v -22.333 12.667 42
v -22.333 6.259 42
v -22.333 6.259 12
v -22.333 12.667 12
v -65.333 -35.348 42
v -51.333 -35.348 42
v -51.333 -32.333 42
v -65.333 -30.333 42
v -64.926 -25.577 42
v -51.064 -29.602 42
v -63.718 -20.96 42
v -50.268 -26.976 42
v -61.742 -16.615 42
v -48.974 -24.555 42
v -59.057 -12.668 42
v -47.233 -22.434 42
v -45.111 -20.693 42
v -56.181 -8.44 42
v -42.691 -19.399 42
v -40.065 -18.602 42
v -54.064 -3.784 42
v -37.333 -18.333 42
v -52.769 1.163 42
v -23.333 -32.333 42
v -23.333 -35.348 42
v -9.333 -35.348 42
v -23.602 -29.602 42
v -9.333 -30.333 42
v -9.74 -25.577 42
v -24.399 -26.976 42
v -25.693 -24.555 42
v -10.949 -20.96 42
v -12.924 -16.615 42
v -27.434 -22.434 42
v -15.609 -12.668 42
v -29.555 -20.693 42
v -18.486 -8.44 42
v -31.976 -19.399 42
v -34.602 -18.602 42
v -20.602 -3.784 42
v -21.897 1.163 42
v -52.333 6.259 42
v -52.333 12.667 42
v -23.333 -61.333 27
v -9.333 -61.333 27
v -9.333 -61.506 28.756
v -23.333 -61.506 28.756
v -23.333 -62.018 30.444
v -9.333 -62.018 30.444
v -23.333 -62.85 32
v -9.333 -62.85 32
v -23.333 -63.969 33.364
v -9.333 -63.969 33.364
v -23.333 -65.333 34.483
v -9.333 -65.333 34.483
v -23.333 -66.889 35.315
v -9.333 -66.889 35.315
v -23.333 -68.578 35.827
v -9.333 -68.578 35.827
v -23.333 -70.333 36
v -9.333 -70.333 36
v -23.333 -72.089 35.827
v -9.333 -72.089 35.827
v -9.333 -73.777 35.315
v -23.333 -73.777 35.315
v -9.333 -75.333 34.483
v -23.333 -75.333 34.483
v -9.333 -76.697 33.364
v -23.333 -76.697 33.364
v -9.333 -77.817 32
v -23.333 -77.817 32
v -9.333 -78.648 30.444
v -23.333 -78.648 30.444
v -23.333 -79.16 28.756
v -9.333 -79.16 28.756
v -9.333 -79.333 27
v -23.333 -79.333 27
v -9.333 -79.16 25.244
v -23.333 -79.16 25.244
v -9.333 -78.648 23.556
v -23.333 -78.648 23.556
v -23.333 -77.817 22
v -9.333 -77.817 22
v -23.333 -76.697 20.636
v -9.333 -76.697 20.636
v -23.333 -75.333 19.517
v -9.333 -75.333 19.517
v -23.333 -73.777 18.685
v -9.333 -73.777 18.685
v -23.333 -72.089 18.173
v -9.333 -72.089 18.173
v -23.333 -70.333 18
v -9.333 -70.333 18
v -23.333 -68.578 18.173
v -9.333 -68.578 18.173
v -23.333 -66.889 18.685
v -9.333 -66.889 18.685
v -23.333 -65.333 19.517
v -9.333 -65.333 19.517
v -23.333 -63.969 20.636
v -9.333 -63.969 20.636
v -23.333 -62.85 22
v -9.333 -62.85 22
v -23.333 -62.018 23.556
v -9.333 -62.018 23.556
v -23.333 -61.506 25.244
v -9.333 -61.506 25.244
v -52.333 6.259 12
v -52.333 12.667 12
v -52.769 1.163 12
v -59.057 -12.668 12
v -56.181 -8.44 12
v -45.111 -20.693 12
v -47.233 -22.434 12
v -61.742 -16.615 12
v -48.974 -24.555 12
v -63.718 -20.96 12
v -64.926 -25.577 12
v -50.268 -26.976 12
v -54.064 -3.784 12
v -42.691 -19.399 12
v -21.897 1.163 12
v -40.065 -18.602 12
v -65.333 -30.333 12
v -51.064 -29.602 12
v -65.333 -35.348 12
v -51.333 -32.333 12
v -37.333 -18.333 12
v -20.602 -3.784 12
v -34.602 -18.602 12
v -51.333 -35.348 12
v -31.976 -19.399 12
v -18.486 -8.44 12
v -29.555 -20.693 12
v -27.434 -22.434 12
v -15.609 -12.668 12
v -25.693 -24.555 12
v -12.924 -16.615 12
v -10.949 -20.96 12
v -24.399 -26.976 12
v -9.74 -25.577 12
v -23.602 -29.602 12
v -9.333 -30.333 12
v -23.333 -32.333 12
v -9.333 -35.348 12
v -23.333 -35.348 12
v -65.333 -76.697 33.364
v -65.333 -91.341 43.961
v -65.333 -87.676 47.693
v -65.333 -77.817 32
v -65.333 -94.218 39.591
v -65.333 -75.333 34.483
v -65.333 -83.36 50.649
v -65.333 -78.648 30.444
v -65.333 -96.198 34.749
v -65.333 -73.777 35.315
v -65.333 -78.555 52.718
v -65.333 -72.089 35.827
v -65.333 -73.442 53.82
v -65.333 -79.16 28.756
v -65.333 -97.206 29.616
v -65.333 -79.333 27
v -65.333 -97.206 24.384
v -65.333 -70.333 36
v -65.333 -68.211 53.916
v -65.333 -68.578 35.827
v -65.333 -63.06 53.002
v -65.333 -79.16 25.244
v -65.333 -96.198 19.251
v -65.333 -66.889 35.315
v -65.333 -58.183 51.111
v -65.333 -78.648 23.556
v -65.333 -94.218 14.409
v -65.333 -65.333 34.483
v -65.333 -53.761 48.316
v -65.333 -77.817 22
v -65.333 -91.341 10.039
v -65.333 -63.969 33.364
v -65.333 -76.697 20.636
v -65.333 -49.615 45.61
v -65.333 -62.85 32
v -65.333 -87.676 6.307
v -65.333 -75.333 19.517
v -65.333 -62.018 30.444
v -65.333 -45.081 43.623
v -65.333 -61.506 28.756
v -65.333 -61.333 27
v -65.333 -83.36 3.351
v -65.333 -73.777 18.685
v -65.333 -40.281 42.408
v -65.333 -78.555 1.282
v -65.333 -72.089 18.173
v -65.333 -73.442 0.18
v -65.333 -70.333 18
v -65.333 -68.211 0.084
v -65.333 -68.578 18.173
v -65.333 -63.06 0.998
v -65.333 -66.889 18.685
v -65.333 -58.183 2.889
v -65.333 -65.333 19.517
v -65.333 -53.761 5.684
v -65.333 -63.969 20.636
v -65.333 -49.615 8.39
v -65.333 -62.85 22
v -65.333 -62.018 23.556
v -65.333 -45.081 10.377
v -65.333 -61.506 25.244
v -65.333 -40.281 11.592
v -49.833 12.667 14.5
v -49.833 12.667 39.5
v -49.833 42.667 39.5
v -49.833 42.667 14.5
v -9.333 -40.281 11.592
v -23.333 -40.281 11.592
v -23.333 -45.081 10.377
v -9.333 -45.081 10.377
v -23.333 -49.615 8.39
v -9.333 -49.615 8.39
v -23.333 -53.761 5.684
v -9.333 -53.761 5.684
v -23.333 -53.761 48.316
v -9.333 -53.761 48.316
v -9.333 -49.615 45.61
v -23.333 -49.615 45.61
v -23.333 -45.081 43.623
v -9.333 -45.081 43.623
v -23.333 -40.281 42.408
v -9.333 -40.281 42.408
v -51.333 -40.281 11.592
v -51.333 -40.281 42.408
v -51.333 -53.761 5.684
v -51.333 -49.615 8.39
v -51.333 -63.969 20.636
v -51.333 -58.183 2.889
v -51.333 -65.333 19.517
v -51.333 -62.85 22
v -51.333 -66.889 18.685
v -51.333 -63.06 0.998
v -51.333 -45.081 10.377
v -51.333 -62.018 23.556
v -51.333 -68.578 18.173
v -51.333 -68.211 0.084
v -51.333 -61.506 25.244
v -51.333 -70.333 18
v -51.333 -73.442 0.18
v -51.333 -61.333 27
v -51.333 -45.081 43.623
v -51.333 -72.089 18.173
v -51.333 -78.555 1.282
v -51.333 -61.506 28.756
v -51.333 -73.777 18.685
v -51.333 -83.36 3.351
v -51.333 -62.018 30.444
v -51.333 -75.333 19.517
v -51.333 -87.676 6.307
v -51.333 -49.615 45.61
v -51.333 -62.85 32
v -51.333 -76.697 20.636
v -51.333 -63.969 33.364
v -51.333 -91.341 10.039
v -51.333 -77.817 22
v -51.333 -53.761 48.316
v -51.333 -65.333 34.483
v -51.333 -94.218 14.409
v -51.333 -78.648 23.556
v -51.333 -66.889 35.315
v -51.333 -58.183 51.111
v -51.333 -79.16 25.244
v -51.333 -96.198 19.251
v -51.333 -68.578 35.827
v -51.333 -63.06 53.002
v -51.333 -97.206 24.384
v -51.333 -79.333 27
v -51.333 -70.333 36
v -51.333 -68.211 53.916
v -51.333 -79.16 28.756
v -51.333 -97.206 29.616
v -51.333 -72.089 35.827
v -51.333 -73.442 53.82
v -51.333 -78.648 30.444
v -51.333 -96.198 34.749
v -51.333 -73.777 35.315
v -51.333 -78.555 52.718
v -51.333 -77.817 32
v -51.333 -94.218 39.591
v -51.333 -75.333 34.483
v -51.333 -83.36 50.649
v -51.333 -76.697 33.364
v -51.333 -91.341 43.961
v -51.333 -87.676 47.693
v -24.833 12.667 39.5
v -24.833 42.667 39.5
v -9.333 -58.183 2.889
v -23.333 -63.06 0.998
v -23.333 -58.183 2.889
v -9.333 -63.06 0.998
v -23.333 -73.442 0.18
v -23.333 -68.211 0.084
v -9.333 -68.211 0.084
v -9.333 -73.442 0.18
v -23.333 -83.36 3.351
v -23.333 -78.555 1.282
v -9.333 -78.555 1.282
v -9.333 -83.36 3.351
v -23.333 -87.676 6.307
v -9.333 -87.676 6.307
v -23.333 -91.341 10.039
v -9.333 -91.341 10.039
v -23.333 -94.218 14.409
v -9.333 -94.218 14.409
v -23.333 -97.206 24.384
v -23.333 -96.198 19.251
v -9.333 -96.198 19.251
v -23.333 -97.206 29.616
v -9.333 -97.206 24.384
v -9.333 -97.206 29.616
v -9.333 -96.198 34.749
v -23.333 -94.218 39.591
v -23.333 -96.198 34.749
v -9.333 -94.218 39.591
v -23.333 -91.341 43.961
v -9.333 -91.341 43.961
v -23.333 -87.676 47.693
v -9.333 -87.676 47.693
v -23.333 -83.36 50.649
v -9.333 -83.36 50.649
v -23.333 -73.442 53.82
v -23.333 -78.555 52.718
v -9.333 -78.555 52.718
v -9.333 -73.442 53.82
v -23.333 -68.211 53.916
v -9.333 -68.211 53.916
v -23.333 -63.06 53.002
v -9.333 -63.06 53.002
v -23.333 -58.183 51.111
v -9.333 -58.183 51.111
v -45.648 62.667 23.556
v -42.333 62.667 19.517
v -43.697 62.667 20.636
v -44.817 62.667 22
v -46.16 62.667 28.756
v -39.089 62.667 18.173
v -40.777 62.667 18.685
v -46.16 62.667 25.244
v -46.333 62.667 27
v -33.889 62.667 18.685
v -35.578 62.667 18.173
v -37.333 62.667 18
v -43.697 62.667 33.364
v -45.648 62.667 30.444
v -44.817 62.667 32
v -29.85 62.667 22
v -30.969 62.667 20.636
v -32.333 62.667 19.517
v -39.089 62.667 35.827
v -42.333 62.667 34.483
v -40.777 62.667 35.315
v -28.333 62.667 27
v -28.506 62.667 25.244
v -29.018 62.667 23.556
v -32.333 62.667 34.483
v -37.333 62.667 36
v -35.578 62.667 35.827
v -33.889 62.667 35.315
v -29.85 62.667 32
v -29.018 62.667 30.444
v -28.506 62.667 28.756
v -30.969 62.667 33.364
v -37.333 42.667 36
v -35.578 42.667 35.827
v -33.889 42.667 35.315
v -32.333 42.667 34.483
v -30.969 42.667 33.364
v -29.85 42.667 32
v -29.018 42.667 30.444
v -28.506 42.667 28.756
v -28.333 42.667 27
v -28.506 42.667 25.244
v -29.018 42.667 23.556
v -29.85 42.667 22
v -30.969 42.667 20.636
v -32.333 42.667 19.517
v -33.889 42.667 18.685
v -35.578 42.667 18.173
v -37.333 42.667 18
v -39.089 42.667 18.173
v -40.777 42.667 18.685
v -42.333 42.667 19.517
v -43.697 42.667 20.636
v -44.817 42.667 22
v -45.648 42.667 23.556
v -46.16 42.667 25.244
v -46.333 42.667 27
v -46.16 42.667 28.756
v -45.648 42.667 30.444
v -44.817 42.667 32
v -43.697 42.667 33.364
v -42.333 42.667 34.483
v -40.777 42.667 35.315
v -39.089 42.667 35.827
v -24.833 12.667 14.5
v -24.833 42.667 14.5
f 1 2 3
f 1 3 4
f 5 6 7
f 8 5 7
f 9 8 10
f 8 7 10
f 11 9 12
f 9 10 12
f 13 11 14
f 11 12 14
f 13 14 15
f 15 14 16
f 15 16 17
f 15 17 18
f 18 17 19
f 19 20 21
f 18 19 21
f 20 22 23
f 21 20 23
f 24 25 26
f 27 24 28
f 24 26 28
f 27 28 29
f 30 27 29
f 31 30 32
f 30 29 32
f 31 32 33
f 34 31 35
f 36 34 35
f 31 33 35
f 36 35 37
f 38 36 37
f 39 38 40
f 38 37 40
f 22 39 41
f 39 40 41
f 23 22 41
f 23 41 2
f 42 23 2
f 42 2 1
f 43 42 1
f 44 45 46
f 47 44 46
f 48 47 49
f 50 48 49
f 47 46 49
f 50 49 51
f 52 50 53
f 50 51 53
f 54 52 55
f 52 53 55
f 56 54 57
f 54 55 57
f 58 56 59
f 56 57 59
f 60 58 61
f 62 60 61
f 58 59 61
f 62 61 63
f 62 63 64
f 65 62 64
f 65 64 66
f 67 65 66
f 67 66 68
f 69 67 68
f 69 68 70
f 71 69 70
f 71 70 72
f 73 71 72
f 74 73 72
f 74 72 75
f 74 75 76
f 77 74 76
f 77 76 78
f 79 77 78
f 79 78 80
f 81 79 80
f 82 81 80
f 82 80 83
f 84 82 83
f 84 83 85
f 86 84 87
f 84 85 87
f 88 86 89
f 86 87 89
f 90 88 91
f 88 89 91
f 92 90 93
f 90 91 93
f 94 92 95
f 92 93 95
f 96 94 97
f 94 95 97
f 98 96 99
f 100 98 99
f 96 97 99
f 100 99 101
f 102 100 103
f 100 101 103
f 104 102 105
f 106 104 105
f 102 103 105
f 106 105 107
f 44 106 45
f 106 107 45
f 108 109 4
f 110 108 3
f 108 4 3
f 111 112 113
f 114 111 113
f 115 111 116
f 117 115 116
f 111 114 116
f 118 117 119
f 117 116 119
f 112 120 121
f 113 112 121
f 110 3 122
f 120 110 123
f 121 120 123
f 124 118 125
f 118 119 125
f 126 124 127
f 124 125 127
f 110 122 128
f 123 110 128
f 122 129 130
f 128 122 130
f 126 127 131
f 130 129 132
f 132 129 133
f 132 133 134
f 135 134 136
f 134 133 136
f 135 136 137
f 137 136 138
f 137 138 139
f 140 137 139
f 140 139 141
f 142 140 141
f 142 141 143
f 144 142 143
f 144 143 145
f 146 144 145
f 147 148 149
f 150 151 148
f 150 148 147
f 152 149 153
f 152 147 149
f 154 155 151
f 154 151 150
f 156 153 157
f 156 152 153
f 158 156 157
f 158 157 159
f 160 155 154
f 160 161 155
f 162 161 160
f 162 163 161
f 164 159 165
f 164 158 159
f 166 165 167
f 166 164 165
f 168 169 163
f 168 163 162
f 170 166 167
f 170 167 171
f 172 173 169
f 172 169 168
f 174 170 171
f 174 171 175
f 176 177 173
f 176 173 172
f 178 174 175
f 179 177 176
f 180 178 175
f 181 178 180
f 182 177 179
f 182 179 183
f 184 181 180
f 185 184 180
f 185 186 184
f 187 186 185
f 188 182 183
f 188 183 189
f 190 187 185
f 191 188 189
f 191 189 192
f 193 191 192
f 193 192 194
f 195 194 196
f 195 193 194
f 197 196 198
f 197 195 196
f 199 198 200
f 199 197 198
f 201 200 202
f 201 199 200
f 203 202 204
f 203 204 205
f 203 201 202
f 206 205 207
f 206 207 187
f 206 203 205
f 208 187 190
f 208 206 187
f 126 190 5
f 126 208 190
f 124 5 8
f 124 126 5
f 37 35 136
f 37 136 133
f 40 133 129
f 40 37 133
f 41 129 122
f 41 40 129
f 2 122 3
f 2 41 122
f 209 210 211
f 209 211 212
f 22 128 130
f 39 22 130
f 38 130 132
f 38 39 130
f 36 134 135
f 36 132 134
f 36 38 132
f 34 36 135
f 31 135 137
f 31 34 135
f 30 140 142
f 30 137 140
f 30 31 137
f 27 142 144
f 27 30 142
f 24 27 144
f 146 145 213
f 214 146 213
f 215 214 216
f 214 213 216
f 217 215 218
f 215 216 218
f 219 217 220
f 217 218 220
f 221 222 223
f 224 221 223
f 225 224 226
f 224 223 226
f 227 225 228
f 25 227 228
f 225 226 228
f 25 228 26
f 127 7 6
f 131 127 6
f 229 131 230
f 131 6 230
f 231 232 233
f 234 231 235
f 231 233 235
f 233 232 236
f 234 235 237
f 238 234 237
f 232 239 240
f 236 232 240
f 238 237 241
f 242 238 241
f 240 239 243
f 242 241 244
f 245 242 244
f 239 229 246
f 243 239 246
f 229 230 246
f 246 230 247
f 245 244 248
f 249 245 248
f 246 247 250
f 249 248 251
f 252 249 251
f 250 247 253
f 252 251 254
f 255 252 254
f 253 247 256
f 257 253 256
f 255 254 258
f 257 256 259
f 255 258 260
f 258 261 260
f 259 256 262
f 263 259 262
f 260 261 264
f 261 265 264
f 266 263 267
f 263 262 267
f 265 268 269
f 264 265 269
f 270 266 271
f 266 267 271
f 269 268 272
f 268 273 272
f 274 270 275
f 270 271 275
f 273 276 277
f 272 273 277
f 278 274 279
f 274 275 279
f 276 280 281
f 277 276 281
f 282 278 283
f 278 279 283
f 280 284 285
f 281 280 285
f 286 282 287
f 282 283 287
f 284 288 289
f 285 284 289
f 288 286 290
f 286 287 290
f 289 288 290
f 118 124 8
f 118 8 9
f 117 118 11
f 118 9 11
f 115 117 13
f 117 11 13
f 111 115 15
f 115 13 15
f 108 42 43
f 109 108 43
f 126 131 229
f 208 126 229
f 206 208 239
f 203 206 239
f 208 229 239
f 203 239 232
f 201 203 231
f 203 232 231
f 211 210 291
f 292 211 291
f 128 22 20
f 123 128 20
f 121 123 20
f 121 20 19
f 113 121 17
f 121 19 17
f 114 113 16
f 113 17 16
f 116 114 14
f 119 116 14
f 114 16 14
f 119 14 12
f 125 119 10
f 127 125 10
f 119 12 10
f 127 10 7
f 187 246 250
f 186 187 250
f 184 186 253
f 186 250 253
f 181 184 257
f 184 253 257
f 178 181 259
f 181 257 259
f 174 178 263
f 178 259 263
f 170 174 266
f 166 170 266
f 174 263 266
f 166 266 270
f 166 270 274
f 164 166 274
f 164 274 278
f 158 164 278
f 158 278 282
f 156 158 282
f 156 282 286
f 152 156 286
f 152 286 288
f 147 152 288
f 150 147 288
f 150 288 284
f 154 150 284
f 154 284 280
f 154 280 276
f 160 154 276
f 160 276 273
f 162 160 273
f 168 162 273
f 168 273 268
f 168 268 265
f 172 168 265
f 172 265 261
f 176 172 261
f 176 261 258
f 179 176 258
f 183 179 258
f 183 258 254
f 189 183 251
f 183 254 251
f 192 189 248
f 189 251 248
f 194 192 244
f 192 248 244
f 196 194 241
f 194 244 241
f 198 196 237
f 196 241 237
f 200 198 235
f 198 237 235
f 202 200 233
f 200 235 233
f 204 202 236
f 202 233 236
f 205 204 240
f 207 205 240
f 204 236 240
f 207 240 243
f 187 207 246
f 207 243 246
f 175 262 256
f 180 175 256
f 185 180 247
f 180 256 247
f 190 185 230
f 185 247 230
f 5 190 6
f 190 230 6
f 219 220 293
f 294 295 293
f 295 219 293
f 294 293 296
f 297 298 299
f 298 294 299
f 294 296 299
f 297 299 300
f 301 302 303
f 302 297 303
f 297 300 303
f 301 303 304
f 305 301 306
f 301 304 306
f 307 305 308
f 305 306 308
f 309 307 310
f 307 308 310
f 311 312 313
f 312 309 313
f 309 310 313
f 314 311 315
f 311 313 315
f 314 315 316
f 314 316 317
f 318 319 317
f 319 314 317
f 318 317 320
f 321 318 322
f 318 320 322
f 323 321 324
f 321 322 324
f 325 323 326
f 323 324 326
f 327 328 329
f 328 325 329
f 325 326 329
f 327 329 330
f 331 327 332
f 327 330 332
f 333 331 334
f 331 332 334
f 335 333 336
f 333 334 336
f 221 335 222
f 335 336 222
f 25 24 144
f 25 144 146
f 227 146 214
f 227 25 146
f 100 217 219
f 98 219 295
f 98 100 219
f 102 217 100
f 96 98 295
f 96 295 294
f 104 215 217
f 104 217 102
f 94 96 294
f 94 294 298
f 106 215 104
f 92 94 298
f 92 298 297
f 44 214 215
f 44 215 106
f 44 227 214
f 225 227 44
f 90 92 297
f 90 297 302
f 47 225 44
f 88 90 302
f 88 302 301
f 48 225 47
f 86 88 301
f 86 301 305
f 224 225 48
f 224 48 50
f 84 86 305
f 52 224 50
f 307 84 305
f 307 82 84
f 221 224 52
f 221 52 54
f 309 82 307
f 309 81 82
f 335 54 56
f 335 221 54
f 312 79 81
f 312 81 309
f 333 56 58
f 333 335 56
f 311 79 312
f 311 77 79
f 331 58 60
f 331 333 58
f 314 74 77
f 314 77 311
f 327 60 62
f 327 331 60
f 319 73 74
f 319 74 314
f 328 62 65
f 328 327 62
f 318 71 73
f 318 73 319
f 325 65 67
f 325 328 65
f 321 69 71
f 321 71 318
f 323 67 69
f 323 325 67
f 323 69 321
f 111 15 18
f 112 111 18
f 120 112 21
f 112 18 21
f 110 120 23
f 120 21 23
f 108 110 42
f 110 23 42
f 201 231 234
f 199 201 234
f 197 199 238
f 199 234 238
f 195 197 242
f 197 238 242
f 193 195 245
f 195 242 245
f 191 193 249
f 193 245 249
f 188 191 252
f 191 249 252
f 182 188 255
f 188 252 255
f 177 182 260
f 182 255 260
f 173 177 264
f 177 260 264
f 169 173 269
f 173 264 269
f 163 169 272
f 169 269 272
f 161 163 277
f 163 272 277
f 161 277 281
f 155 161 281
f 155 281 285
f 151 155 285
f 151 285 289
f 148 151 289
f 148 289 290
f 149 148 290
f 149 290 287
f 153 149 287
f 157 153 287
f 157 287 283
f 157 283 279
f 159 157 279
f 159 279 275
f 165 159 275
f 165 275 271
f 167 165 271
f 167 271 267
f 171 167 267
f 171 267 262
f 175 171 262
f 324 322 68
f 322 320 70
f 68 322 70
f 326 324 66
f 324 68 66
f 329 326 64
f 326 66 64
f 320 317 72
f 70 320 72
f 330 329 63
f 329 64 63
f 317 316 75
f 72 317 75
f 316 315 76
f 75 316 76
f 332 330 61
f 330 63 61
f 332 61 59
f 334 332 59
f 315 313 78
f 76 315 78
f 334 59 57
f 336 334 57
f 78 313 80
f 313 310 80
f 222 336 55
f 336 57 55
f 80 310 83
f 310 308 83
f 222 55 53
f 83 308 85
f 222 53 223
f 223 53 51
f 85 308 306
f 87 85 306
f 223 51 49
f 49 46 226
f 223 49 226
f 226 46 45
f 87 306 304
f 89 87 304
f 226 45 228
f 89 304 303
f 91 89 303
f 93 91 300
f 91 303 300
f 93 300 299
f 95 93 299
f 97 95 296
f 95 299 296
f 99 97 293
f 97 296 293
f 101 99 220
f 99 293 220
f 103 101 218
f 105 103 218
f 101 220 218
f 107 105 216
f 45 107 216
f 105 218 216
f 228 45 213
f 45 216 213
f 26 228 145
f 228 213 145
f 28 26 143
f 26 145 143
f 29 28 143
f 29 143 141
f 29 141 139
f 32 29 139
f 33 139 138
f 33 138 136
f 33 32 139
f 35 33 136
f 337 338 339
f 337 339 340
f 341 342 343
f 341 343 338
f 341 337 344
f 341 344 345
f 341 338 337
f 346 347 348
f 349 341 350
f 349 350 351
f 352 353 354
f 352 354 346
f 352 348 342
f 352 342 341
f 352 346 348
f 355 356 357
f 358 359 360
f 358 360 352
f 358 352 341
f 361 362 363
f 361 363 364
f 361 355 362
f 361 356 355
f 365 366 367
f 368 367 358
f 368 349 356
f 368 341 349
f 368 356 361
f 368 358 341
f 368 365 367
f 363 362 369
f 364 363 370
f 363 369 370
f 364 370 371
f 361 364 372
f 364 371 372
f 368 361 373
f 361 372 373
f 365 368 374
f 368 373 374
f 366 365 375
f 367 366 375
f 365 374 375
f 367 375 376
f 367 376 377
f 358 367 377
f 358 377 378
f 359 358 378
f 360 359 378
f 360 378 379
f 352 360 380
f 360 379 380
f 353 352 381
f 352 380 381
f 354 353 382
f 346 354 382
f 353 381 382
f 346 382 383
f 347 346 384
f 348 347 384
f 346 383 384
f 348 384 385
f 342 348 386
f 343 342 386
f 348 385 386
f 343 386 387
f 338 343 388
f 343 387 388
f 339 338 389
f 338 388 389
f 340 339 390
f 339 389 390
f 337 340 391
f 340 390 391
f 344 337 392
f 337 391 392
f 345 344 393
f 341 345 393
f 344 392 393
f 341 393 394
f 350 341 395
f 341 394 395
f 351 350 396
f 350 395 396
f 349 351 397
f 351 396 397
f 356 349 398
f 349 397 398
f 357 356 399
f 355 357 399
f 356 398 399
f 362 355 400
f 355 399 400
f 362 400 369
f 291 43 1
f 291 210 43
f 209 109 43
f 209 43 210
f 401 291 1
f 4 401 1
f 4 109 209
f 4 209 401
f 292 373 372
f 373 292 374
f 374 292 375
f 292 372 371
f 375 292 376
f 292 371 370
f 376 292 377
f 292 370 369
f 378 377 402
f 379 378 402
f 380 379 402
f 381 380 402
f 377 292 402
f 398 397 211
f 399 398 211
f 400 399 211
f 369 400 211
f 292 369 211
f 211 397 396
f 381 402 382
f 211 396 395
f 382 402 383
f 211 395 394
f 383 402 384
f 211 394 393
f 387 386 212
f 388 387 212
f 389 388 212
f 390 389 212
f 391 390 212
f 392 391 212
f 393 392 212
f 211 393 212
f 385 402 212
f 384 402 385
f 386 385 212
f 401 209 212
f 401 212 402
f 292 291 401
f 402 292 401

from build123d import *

# Parameters (mm, degrees)
SKETCH1_W           = 56
SKETCH1_H           = 140
BOSS_EXTRUDE1_DEPTH = 54
CUT_EXTRUDE4_DEPTH  = 54
SKETCH5_OUTSIDE_W   = 88.032
SKETCH5_OUTSIDE_H   = 174.032
SKETCH5_OUTSIDE_R   = 9
CUT_EXTRUDE6_DEPTH  = 60
SKETCH6_OUTSIDE_W   = 90.032
SKETCH6_OUTSIDE_H   = 88.032
SKETCH6_OUTSIDE_W_2 = 25
SKETCH6_OUTSIDE_H_2 = 25
CUT_EXTRUDE7_DEPTH  = 30
SKETCH7_R           = 9
BOSS_EXTRUDE2_DEPTH = 20


with BuildPart() as part:
    # Sketch1 → Boss-Extrude1 (new body)
    with BuildSketch(Plane.XY):
        with Locations((-37.333333333, -27.333333333)):
            Rectangle(SKETCH1_W, SKETCH1_H)
    extrude(amount=BOSS_EXTRUDE1_DEPTH)

    # Sketch2 → Cut-Extrude4 (cut)
    with BuildSketch(Plane.XY.offset(54)):
        with BuildLine():
            Line((-52.333333333, 6.259015594), (-52.333333333, 42.666666667))
            Line((-52.333333333, 42.666666667), (-65.333333333, 42.666666667))
            Line((-65.333333333, 42.666666667), (-65.333333333, -30.333333244))
            ThreePointArc((-65.333333333, -30.333333244), (-63.717759237, -20.959856403), (-59.057471264, -12.668061438))
            ThreePointArc((-59.057471264, -12.668061438), (-54.064305564, -3.783995357), (-52.333333333, 6.259015594))
        make_face()
        with BuildLine():
            Line((-37.333333333, -97.333333333), (-37.333333333, -18.333333333))
            ThreePointArc((-37.333333333, -18.333333333), (-47.23282827, -22.433838397), (-51.333333333, -32.333333333))
            Line((-51.333333333, -32.333333333), (-51.333333333, -54.582044639))
            Line((-51.333333333, -54.582044639), (-51.333333333, -97.333333333))
            Line((-51.333333333, -97.333333333), (-37.333333333, -97.333333333))
        make_face()
        with BuildLine():
            ThreePointArc((-37.333333333, -18.333333333), (-27.433838397, -22.433838397), (-23.333333333, -32.333333333))
            Line((-23.333333333, -32.333333333), (-23.333333333, -97.333333333))
            Line((-23.333333333, -97.333333333), (-9.333333333, -97.333333333))
            Line((-9.333333333, -97.333333333), (-9.333333333, 42.666666667))
            Line((-9.333333333, 42.666666667), (-22.333333333, 42.666666667))
            Line((-22.333333333, 42.666666667), (-37.333333333, 42.666666667))
            Line((-37.333333333, 42.666666667), (-37.333333333, -18.333333333))
        make_face()
        with BuildLine():
            Line((-23.333333333, -97.333333333), (-23.333333333, -32.333333333))
            ThreePointArc((-23.333333333, -32.333333333), (-27.433838397, -22.433838397), (-37.333333333, -18.333333333))
            Line((-37.333333333, -18.333333333), (-37.333333333, -97.333333333))
            Line((-37.333333333, -97.333333333), (-23.333333333, -97.333333333))
        make_face()
    extrude(amount=-CUT_EXTRUDE4_DEPTH, mode=Mode.SUBTRACT)

    # Mirror3: part across plane


with BuildPart() as part_1:
    add(part.part)
    add(part.part.mirror(Plane.ZY.offset(37.333333333)))

    # Sketch5 outside → Cut-Extrude6 (cut)
    # profile 1 of 2: a face of its own
    with BuildSketch(Plane(origin=(-9.333333333, 0, 0), x_dir=(0, 0, -1), z_dir=(1, 0, 0))):
        with Locations((-27, -27.333)):
            Rectangle(SKETCH5_OUTSIDE_W, SKETCH5_OUTSIDE_H)
        with BuildLine():
            Line((-42, 42.666666667), (-12, 42.666666667))
            Line((-12, 42.666666667), (-12, -35.347621964))
            ThreePointArc((-12, -35.347621964), (-10.377159088, -45.080907232), (-5.684210526, -53.761154264))
            ThreePointArc((-5.684210526, -53.761154264), (-27, -97.333333333), (-48.315789474, -53.761154264))
            ThreePointArc((-48.315789474, -53.761154264), (-43.622840912, -45.080907232), (-42, -35.347621964))
            Line((-42, -35.347621964), (-42, 42.666666667))
        make_face(mode=Mode.SUBTRACT)
    # profile 2 of 2: a face of its own
    with BuildSketch(Plane(origin=(-9.333333333, 0, 0), x_dir=(0, 0, -1), z_dir=(1, 0, 0))):
        with Locations(Location((-27, -70.333333333, 0), (0, 0, 90))):
            Circle(SKETCH5_OUTSIDE_R)
    extrude(amount=-CUT_EXTRUDE6_DEPTH, mode=Mode.SUBTRACT)

    # Sketch6 outside → Cut-Extrude7 (cut)
    with BuildSketch(Plane(origin=(0, 42.666666667, 0), x_dir=(1, 0, 0), z_dir=(0, 1, 0))):
        with Locations((-37.333, -27)):
            Rectangle(SKETCH6_OUTSIDE_W, SKETCH6_OUTSIDE_H)
        with Locations((-37.333333333, -27)):
            Rectangle(SKETCH6_OUTSIDE_W_2, SKETCH6_OUTSIDE_H_2, mode=Mode.SUBTRACT)
    extrude(amount=-CUT_EXTRUDE7_DEPTH, mode=Mode.SUBTRACT)

    # Sketch7 → Boss-Extrude2 (add)
    with BuildSketch(Plane(origin=(0, 42.666666667, 0), x_dir=(1, 0, 0), z_dir=(0, 1, 0))):
        with Locations(Location((-37.333333333, -27, 0), (0, 0, 270))):
            Circle(SKETCH7_R)
    extrude(amount=BOSS_EXTRUDE2_DEPTH)


solid = part_1.part
